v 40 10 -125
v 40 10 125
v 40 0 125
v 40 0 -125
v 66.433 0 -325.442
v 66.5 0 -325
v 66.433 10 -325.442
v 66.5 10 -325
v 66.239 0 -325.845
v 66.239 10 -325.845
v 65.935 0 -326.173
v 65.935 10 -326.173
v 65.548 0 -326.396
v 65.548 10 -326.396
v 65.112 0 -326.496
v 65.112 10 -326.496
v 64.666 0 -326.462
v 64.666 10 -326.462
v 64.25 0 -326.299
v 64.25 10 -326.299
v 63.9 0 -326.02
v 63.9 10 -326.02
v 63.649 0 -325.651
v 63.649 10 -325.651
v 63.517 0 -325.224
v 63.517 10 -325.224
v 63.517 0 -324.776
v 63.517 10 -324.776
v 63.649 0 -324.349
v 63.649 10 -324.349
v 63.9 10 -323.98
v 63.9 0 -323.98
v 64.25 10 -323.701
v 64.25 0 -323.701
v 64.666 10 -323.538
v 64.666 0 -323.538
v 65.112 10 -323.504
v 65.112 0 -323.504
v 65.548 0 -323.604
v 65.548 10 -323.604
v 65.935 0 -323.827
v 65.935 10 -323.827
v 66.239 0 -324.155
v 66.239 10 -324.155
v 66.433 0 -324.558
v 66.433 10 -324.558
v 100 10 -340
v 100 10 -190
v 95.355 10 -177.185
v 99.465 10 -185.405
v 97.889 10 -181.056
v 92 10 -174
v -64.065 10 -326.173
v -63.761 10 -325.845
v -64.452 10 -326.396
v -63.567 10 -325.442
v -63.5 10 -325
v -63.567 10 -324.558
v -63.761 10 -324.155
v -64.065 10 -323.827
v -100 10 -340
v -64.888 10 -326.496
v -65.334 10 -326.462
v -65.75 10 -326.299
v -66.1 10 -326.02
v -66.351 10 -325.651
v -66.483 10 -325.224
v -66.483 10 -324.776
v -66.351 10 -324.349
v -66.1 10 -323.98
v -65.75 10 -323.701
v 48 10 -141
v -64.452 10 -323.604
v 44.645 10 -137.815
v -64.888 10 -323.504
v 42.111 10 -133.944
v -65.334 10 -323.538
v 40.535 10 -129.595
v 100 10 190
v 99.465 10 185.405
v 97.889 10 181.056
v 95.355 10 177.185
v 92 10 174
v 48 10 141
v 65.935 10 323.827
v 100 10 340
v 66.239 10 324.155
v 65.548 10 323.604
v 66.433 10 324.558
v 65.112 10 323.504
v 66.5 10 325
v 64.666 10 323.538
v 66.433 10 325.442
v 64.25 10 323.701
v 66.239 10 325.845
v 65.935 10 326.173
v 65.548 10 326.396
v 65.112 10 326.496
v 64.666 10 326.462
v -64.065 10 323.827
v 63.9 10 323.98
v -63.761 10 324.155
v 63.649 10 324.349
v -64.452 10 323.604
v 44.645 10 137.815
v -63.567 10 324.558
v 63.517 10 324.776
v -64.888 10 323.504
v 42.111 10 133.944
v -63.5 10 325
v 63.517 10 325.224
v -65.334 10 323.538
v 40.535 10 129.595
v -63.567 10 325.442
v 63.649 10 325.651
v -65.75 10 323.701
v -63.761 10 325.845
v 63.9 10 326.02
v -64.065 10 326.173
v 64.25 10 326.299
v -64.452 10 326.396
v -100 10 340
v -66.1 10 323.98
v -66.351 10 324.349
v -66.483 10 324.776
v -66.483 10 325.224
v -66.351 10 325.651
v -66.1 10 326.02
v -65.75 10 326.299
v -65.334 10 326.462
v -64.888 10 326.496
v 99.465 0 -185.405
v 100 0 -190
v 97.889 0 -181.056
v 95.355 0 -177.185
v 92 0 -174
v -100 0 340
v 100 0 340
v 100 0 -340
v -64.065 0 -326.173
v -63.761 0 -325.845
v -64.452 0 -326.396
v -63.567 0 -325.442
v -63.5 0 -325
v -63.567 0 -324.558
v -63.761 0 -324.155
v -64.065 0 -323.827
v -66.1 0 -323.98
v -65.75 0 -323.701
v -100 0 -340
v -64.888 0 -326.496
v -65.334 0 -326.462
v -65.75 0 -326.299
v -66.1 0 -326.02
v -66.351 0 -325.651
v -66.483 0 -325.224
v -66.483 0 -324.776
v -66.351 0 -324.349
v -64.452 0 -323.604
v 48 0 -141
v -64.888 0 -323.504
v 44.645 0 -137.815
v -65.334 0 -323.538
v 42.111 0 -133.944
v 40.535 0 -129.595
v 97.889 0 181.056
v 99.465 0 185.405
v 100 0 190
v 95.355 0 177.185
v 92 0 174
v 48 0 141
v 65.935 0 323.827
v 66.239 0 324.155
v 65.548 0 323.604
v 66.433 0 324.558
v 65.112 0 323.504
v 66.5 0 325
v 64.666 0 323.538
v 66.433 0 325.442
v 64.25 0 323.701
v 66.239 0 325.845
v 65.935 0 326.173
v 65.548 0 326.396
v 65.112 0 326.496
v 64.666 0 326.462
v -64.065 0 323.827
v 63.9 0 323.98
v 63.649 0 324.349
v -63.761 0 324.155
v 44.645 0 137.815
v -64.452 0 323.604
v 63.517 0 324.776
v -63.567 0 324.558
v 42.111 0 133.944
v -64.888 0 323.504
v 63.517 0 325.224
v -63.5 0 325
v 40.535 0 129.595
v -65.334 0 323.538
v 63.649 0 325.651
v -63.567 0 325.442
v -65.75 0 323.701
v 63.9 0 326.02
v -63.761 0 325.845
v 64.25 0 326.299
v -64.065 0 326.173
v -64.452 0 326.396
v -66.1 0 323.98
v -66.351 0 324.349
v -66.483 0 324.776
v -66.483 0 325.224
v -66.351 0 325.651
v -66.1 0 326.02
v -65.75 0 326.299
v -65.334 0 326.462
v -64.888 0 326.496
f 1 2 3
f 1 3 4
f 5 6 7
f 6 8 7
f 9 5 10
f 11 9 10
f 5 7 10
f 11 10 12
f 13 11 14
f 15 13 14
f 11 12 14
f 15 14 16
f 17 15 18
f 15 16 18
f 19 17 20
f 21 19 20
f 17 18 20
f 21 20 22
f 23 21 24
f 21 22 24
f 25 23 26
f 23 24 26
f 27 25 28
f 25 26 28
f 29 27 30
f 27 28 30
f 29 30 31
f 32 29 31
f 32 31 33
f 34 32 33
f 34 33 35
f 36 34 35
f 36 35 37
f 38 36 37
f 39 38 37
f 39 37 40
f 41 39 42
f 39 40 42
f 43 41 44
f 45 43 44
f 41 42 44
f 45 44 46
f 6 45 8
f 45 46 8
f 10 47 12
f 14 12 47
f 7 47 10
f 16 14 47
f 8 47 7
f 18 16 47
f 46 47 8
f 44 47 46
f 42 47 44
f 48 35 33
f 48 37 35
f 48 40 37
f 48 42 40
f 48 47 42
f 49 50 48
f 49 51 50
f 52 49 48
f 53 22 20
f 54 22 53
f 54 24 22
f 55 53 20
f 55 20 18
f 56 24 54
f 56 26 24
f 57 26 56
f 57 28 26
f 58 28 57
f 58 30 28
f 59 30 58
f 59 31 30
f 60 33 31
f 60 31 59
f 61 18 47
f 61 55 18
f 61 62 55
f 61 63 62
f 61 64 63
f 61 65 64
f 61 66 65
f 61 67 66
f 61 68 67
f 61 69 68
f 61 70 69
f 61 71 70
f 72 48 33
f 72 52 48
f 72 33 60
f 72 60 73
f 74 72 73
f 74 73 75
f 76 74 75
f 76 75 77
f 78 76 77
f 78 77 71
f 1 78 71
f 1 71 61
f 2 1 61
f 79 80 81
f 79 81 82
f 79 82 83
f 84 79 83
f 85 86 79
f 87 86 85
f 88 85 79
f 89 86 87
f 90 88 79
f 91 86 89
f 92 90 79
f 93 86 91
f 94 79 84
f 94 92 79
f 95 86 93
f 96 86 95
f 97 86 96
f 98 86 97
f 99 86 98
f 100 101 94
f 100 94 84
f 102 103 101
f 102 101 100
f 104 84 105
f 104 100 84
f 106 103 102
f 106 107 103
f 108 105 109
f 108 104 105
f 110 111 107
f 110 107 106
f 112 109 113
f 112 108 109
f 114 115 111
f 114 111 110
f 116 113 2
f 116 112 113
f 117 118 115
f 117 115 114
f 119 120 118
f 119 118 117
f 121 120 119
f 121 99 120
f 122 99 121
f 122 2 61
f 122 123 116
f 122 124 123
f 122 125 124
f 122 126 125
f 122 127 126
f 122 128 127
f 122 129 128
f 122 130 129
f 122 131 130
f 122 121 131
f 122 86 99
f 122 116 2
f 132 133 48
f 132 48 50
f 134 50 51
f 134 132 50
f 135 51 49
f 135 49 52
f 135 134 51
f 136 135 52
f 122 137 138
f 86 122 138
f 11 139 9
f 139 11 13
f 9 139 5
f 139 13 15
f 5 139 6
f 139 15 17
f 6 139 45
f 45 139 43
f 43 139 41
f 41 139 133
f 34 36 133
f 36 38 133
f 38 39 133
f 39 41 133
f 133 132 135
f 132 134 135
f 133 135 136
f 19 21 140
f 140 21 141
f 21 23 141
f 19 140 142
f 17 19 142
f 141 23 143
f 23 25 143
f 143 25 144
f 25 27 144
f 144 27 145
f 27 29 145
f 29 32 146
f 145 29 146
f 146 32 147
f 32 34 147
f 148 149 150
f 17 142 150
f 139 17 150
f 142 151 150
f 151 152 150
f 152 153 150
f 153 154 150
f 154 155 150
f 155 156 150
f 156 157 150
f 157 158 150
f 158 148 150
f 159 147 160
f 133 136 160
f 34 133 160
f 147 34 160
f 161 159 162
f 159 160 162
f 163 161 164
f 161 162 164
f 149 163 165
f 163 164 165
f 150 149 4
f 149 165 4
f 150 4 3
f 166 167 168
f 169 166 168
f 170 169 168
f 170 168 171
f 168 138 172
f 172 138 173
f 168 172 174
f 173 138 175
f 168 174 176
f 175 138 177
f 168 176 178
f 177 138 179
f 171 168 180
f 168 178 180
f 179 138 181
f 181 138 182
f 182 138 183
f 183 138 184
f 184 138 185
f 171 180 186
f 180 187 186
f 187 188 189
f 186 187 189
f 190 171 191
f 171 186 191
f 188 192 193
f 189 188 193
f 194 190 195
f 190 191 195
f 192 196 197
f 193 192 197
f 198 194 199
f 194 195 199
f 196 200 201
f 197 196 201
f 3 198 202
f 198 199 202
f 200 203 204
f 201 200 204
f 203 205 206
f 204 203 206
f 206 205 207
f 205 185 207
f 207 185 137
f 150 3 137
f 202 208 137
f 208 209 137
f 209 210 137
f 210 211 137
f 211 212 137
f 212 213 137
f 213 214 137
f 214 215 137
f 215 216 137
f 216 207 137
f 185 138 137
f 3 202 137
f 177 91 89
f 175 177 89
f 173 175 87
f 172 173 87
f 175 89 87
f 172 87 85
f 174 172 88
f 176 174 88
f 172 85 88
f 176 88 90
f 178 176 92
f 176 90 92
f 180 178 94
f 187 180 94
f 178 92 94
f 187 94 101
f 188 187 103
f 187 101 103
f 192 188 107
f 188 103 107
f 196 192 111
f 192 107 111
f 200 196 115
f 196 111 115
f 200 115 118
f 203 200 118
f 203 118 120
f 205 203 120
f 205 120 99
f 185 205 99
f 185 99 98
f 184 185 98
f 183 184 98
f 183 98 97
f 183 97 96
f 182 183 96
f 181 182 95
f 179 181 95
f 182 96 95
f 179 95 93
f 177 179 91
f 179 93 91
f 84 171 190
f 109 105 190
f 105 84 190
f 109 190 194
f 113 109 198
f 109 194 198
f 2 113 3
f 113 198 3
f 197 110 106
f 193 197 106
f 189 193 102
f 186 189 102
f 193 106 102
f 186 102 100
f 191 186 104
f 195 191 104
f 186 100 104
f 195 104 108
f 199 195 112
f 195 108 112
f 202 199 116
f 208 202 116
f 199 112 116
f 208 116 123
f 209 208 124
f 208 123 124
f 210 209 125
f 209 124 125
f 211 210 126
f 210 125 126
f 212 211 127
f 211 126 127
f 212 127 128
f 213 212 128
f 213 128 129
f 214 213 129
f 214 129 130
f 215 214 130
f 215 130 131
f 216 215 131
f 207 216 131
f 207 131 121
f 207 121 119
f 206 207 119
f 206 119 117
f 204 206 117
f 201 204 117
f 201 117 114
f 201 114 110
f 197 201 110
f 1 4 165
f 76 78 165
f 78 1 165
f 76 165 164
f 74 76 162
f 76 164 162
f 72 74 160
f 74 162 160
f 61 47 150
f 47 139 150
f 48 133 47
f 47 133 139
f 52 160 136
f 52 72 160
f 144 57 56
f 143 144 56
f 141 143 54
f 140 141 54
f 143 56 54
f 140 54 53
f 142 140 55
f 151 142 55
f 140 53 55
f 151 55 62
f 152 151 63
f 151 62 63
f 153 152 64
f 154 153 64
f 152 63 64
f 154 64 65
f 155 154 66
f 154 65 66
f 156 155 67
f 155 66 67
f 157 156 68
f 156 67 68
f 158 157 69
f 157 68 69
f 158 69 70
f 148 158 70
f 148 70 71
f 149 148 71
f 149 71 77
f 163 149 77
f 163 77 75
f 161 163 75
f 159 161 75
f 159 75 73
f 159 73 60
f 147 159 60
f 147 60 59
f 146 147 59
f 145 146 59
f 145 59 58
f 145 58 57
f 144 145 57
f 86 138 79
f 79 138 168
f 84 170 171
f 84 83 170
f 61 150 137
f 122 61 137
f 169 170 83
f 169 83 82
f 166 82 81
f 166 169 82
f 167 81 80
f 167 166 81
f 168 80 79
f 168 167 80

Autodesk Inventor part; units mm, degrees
ref_plane "YZ Plane" through (0, 0, 0) normal (1, 0, 0) x (0, 1, 0)
ref_plane "XZ Plane" through (0, 0, 0) normal (0, 1, 0) x (-1, 0, 0)
ref_plane "XY Plane" through (0, 0, 0) normal (0, 0, 1) x (1, 0, 0)
sketch "Esquisse1" plane through (0, 0, 0) normal (0, 1, 0) x (-1, 0, 0)
  line L0 (100, 340) -> (-100, 340)
  line L1 (-100, 340) -> (-100, -340)
  line L2 (-100, -340) -> (100, -340)
  line L3 (100, -340) -> (100, 340)
  point P0 (0, 0)
  dimension "d0" = 200
  dimension "d1" = 680
  dimension "d2" = 340
  dimension "d3" = 100
extrude "Extrusion1" add sketch "Esquisse1" along normal blind 10
sketch "Esquisse2" plane through (0, 10, 0) normal (0, 1, 0) x (1, 0, 0)
  line L0 (100, -340) -> (100, 340) projected
  line L1 (100, -180) -> (40, -135)
  line L2 (40, -135) -> (40, 135)
  line L3 (40, 135) -> (100, 180)
  line L4 (-100, 340) -> (-100, -340) projected
  point P0 (0, 0)
  dimension "d6" = 140
  dimension "d7" = 160
  dimension "d8" = 270
  dimension "d9" = 135
  dimension "d10" = 160
extrude "Extrusion2" cut sketch "Esquisse2" against normal through all
fillet "Congé1" radius 20 4 edges at (40, 5, 135) (100, 5, 180) (40, 5, -135) (100, 5, -180)
sketch "Esquisse3" plane through (0, 10, 0) normal (0, 1, 0) x (1, 0, 0)
  circle A0 centre (-65, -325) radius 1.5
  circle A1 centre (65, -325) radius 1.5
  circle A2 centre (65, 325) radius 1.5
  circle A3 centre (-65, 325) radius 1.5
  line L0 (-100, 340) -> (-100, -340) projected
  line L1 (100, -340) -> (100, -190) projected
  line L2 (100, 190) -> (100, 340) projected
  line L3 (100, 340) -> (-100, 340) projected
  line L4 (-100, -340) -> (100, -340) projected
  point P0 (0, 0)
  dimension "d14" = 3
  dimension "d15" = 3
  dimension "d16" = 3
  dimension "d17" = 3
  dimension "d18" = 35
  dimension "d19" = 35
  dimension "d20" = 35
  dimension "d21" = 35
  dimension "d22" = 15
  dimension "d23" = 15
  dimension "d24" = 15
  dimension "d25" = 15
extrude "Extrusion3" cut sketch "Esquisse3" against normal through all
equation "\"d2\" = 0.5 * d1"
equation "\"d3\" = 0.5 * d0"
equation "\"d9\" = 0.5 * d8"
equation "\"d15\" = d14"
equation "\"d16\" = d14"
equation "\"d17\" = d14"
equation "\"d19\" = d18"
equation "\"d20\" = d18"
equation "\"d21\" = d18"
equation "\"d23\" = d22"
equation "\"d24\" = d22"
equation "\"d25\" = d24"
properties part number "Coté court plateau"
